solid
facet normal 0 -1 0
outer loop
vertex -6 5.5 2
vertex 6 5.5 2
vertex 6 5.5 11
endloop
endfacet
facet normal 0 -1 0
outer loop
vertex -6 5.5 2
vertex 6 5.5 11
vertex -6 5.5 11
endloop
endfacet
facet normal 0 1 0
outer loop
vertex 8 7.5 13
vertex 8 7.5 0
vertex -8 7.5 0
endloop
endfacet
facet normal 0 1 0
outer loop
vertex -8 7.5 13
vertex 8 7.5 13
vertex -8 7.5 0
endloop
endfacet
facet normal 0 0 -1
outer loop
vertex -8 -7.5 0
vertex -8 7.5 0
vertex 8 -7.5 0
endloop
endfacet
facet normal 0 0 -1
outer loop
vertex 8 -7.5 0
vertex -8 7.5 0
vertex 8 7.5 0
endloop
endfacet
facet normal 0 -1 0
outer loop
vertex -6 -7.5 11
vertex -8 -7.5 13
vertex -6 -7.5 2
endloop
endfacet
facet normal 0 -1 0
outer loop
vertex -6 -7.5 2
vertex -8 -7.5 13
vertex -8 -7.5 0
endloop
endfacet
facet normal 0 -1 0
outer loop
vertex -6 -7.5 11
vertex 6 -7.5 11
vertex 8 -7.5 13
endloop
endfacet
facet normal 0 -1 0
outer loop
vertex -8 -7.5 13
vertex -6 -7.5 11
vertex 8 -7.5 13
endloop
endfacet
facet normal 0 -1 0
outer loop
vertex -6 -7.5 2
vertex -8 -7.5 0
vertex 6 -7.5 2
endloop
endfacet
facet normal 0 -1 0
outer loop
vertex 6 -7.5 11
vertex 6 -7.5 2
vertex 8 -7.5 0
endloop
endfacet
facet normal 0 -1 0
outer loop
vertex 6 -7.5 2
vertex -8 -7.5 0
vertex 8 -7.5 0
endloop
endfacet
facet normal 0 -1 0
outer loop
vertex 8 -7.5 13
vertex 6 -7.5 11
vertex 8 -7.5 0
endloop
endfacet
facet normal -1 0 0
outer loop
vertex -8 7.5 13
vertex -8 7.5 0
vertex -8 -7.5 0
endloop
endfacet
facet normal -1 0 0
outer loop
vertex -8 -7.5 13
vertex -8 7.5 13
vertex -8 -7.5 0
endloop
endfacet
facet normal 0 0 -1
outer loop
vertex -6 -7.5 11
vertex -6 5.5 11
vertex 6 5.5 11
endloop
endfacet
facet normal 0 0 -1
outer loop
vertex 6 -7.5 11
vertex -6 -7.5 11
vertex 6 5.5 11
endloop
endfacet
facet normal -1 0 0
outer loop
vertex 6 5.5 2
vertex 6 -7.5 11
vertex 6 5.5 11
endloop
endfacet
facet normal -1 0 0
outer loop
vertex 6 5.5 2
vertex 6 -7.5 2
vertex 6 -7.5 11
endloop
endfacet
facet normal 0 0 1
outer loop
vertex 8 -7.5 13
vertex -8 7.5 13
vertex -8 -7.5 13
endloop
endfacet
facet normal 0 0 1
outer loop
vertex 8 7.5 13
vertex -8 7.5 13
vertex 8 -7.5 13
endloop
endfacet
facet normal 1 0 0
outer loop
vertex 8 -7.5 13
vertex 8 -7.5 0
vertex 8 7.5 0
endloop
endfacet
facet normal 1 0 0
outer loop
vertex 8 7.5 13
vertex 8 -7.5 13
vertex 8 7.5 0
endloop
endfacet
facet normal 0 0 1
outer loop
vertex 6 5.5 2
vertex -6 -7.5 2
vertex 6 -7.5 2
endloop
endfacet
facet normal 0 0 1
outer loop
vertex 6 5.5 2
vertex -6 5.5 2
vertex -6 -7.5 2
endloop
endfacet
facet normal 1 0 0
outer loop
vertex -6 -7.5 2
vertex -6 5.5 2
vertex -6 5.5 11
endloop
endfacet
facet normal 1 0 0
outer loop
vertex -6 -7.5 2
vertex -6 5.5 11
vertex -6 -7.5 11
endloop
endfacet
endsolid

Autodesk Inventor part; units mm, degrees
ref_plane "YZ Plane" through (0, 0, 0) normal (1, 0, 0) x (0, 1, 0)
ref_plane "XZ Plane" through (0, 0, 0) normal (0, 1, 0) x (-1, 0, 0)
ref_plane "XY Plane" through (0, 0, 0) normal (0, 0, 1) x (1, 0, 0)
sketch "Skizze1" plane through (0, 0, 0) normal (0, 0, 1) x (1, 0, 0)
  line L0 (-8, -7.5) -> (8, -7.5)
  line L1 (8, -7.5) -> (8, 7.5)
  line L2 (8, 7.5) -> (-8, 7.5)
  line L3 (-8, 7.5) -> (-8, -7.5)
  line L4 (-8, -7.5) -> (8, 7.5) construction
  line L5 (8, -7.5) -> (-8, 7.5) construction
  point P0 (0, 0)
  dimension "d0" = 16
  dimension "d1" = 15
extrude "Extrusion1" add sketch "Skizze1" along normal blind 13
shell "Wandstärke1" thickness 2 removed faces 1 at (-2.6667, -7.5, 4.3333)
properties part number "RJ45-Buchse" material "Stahl, verchromt"
